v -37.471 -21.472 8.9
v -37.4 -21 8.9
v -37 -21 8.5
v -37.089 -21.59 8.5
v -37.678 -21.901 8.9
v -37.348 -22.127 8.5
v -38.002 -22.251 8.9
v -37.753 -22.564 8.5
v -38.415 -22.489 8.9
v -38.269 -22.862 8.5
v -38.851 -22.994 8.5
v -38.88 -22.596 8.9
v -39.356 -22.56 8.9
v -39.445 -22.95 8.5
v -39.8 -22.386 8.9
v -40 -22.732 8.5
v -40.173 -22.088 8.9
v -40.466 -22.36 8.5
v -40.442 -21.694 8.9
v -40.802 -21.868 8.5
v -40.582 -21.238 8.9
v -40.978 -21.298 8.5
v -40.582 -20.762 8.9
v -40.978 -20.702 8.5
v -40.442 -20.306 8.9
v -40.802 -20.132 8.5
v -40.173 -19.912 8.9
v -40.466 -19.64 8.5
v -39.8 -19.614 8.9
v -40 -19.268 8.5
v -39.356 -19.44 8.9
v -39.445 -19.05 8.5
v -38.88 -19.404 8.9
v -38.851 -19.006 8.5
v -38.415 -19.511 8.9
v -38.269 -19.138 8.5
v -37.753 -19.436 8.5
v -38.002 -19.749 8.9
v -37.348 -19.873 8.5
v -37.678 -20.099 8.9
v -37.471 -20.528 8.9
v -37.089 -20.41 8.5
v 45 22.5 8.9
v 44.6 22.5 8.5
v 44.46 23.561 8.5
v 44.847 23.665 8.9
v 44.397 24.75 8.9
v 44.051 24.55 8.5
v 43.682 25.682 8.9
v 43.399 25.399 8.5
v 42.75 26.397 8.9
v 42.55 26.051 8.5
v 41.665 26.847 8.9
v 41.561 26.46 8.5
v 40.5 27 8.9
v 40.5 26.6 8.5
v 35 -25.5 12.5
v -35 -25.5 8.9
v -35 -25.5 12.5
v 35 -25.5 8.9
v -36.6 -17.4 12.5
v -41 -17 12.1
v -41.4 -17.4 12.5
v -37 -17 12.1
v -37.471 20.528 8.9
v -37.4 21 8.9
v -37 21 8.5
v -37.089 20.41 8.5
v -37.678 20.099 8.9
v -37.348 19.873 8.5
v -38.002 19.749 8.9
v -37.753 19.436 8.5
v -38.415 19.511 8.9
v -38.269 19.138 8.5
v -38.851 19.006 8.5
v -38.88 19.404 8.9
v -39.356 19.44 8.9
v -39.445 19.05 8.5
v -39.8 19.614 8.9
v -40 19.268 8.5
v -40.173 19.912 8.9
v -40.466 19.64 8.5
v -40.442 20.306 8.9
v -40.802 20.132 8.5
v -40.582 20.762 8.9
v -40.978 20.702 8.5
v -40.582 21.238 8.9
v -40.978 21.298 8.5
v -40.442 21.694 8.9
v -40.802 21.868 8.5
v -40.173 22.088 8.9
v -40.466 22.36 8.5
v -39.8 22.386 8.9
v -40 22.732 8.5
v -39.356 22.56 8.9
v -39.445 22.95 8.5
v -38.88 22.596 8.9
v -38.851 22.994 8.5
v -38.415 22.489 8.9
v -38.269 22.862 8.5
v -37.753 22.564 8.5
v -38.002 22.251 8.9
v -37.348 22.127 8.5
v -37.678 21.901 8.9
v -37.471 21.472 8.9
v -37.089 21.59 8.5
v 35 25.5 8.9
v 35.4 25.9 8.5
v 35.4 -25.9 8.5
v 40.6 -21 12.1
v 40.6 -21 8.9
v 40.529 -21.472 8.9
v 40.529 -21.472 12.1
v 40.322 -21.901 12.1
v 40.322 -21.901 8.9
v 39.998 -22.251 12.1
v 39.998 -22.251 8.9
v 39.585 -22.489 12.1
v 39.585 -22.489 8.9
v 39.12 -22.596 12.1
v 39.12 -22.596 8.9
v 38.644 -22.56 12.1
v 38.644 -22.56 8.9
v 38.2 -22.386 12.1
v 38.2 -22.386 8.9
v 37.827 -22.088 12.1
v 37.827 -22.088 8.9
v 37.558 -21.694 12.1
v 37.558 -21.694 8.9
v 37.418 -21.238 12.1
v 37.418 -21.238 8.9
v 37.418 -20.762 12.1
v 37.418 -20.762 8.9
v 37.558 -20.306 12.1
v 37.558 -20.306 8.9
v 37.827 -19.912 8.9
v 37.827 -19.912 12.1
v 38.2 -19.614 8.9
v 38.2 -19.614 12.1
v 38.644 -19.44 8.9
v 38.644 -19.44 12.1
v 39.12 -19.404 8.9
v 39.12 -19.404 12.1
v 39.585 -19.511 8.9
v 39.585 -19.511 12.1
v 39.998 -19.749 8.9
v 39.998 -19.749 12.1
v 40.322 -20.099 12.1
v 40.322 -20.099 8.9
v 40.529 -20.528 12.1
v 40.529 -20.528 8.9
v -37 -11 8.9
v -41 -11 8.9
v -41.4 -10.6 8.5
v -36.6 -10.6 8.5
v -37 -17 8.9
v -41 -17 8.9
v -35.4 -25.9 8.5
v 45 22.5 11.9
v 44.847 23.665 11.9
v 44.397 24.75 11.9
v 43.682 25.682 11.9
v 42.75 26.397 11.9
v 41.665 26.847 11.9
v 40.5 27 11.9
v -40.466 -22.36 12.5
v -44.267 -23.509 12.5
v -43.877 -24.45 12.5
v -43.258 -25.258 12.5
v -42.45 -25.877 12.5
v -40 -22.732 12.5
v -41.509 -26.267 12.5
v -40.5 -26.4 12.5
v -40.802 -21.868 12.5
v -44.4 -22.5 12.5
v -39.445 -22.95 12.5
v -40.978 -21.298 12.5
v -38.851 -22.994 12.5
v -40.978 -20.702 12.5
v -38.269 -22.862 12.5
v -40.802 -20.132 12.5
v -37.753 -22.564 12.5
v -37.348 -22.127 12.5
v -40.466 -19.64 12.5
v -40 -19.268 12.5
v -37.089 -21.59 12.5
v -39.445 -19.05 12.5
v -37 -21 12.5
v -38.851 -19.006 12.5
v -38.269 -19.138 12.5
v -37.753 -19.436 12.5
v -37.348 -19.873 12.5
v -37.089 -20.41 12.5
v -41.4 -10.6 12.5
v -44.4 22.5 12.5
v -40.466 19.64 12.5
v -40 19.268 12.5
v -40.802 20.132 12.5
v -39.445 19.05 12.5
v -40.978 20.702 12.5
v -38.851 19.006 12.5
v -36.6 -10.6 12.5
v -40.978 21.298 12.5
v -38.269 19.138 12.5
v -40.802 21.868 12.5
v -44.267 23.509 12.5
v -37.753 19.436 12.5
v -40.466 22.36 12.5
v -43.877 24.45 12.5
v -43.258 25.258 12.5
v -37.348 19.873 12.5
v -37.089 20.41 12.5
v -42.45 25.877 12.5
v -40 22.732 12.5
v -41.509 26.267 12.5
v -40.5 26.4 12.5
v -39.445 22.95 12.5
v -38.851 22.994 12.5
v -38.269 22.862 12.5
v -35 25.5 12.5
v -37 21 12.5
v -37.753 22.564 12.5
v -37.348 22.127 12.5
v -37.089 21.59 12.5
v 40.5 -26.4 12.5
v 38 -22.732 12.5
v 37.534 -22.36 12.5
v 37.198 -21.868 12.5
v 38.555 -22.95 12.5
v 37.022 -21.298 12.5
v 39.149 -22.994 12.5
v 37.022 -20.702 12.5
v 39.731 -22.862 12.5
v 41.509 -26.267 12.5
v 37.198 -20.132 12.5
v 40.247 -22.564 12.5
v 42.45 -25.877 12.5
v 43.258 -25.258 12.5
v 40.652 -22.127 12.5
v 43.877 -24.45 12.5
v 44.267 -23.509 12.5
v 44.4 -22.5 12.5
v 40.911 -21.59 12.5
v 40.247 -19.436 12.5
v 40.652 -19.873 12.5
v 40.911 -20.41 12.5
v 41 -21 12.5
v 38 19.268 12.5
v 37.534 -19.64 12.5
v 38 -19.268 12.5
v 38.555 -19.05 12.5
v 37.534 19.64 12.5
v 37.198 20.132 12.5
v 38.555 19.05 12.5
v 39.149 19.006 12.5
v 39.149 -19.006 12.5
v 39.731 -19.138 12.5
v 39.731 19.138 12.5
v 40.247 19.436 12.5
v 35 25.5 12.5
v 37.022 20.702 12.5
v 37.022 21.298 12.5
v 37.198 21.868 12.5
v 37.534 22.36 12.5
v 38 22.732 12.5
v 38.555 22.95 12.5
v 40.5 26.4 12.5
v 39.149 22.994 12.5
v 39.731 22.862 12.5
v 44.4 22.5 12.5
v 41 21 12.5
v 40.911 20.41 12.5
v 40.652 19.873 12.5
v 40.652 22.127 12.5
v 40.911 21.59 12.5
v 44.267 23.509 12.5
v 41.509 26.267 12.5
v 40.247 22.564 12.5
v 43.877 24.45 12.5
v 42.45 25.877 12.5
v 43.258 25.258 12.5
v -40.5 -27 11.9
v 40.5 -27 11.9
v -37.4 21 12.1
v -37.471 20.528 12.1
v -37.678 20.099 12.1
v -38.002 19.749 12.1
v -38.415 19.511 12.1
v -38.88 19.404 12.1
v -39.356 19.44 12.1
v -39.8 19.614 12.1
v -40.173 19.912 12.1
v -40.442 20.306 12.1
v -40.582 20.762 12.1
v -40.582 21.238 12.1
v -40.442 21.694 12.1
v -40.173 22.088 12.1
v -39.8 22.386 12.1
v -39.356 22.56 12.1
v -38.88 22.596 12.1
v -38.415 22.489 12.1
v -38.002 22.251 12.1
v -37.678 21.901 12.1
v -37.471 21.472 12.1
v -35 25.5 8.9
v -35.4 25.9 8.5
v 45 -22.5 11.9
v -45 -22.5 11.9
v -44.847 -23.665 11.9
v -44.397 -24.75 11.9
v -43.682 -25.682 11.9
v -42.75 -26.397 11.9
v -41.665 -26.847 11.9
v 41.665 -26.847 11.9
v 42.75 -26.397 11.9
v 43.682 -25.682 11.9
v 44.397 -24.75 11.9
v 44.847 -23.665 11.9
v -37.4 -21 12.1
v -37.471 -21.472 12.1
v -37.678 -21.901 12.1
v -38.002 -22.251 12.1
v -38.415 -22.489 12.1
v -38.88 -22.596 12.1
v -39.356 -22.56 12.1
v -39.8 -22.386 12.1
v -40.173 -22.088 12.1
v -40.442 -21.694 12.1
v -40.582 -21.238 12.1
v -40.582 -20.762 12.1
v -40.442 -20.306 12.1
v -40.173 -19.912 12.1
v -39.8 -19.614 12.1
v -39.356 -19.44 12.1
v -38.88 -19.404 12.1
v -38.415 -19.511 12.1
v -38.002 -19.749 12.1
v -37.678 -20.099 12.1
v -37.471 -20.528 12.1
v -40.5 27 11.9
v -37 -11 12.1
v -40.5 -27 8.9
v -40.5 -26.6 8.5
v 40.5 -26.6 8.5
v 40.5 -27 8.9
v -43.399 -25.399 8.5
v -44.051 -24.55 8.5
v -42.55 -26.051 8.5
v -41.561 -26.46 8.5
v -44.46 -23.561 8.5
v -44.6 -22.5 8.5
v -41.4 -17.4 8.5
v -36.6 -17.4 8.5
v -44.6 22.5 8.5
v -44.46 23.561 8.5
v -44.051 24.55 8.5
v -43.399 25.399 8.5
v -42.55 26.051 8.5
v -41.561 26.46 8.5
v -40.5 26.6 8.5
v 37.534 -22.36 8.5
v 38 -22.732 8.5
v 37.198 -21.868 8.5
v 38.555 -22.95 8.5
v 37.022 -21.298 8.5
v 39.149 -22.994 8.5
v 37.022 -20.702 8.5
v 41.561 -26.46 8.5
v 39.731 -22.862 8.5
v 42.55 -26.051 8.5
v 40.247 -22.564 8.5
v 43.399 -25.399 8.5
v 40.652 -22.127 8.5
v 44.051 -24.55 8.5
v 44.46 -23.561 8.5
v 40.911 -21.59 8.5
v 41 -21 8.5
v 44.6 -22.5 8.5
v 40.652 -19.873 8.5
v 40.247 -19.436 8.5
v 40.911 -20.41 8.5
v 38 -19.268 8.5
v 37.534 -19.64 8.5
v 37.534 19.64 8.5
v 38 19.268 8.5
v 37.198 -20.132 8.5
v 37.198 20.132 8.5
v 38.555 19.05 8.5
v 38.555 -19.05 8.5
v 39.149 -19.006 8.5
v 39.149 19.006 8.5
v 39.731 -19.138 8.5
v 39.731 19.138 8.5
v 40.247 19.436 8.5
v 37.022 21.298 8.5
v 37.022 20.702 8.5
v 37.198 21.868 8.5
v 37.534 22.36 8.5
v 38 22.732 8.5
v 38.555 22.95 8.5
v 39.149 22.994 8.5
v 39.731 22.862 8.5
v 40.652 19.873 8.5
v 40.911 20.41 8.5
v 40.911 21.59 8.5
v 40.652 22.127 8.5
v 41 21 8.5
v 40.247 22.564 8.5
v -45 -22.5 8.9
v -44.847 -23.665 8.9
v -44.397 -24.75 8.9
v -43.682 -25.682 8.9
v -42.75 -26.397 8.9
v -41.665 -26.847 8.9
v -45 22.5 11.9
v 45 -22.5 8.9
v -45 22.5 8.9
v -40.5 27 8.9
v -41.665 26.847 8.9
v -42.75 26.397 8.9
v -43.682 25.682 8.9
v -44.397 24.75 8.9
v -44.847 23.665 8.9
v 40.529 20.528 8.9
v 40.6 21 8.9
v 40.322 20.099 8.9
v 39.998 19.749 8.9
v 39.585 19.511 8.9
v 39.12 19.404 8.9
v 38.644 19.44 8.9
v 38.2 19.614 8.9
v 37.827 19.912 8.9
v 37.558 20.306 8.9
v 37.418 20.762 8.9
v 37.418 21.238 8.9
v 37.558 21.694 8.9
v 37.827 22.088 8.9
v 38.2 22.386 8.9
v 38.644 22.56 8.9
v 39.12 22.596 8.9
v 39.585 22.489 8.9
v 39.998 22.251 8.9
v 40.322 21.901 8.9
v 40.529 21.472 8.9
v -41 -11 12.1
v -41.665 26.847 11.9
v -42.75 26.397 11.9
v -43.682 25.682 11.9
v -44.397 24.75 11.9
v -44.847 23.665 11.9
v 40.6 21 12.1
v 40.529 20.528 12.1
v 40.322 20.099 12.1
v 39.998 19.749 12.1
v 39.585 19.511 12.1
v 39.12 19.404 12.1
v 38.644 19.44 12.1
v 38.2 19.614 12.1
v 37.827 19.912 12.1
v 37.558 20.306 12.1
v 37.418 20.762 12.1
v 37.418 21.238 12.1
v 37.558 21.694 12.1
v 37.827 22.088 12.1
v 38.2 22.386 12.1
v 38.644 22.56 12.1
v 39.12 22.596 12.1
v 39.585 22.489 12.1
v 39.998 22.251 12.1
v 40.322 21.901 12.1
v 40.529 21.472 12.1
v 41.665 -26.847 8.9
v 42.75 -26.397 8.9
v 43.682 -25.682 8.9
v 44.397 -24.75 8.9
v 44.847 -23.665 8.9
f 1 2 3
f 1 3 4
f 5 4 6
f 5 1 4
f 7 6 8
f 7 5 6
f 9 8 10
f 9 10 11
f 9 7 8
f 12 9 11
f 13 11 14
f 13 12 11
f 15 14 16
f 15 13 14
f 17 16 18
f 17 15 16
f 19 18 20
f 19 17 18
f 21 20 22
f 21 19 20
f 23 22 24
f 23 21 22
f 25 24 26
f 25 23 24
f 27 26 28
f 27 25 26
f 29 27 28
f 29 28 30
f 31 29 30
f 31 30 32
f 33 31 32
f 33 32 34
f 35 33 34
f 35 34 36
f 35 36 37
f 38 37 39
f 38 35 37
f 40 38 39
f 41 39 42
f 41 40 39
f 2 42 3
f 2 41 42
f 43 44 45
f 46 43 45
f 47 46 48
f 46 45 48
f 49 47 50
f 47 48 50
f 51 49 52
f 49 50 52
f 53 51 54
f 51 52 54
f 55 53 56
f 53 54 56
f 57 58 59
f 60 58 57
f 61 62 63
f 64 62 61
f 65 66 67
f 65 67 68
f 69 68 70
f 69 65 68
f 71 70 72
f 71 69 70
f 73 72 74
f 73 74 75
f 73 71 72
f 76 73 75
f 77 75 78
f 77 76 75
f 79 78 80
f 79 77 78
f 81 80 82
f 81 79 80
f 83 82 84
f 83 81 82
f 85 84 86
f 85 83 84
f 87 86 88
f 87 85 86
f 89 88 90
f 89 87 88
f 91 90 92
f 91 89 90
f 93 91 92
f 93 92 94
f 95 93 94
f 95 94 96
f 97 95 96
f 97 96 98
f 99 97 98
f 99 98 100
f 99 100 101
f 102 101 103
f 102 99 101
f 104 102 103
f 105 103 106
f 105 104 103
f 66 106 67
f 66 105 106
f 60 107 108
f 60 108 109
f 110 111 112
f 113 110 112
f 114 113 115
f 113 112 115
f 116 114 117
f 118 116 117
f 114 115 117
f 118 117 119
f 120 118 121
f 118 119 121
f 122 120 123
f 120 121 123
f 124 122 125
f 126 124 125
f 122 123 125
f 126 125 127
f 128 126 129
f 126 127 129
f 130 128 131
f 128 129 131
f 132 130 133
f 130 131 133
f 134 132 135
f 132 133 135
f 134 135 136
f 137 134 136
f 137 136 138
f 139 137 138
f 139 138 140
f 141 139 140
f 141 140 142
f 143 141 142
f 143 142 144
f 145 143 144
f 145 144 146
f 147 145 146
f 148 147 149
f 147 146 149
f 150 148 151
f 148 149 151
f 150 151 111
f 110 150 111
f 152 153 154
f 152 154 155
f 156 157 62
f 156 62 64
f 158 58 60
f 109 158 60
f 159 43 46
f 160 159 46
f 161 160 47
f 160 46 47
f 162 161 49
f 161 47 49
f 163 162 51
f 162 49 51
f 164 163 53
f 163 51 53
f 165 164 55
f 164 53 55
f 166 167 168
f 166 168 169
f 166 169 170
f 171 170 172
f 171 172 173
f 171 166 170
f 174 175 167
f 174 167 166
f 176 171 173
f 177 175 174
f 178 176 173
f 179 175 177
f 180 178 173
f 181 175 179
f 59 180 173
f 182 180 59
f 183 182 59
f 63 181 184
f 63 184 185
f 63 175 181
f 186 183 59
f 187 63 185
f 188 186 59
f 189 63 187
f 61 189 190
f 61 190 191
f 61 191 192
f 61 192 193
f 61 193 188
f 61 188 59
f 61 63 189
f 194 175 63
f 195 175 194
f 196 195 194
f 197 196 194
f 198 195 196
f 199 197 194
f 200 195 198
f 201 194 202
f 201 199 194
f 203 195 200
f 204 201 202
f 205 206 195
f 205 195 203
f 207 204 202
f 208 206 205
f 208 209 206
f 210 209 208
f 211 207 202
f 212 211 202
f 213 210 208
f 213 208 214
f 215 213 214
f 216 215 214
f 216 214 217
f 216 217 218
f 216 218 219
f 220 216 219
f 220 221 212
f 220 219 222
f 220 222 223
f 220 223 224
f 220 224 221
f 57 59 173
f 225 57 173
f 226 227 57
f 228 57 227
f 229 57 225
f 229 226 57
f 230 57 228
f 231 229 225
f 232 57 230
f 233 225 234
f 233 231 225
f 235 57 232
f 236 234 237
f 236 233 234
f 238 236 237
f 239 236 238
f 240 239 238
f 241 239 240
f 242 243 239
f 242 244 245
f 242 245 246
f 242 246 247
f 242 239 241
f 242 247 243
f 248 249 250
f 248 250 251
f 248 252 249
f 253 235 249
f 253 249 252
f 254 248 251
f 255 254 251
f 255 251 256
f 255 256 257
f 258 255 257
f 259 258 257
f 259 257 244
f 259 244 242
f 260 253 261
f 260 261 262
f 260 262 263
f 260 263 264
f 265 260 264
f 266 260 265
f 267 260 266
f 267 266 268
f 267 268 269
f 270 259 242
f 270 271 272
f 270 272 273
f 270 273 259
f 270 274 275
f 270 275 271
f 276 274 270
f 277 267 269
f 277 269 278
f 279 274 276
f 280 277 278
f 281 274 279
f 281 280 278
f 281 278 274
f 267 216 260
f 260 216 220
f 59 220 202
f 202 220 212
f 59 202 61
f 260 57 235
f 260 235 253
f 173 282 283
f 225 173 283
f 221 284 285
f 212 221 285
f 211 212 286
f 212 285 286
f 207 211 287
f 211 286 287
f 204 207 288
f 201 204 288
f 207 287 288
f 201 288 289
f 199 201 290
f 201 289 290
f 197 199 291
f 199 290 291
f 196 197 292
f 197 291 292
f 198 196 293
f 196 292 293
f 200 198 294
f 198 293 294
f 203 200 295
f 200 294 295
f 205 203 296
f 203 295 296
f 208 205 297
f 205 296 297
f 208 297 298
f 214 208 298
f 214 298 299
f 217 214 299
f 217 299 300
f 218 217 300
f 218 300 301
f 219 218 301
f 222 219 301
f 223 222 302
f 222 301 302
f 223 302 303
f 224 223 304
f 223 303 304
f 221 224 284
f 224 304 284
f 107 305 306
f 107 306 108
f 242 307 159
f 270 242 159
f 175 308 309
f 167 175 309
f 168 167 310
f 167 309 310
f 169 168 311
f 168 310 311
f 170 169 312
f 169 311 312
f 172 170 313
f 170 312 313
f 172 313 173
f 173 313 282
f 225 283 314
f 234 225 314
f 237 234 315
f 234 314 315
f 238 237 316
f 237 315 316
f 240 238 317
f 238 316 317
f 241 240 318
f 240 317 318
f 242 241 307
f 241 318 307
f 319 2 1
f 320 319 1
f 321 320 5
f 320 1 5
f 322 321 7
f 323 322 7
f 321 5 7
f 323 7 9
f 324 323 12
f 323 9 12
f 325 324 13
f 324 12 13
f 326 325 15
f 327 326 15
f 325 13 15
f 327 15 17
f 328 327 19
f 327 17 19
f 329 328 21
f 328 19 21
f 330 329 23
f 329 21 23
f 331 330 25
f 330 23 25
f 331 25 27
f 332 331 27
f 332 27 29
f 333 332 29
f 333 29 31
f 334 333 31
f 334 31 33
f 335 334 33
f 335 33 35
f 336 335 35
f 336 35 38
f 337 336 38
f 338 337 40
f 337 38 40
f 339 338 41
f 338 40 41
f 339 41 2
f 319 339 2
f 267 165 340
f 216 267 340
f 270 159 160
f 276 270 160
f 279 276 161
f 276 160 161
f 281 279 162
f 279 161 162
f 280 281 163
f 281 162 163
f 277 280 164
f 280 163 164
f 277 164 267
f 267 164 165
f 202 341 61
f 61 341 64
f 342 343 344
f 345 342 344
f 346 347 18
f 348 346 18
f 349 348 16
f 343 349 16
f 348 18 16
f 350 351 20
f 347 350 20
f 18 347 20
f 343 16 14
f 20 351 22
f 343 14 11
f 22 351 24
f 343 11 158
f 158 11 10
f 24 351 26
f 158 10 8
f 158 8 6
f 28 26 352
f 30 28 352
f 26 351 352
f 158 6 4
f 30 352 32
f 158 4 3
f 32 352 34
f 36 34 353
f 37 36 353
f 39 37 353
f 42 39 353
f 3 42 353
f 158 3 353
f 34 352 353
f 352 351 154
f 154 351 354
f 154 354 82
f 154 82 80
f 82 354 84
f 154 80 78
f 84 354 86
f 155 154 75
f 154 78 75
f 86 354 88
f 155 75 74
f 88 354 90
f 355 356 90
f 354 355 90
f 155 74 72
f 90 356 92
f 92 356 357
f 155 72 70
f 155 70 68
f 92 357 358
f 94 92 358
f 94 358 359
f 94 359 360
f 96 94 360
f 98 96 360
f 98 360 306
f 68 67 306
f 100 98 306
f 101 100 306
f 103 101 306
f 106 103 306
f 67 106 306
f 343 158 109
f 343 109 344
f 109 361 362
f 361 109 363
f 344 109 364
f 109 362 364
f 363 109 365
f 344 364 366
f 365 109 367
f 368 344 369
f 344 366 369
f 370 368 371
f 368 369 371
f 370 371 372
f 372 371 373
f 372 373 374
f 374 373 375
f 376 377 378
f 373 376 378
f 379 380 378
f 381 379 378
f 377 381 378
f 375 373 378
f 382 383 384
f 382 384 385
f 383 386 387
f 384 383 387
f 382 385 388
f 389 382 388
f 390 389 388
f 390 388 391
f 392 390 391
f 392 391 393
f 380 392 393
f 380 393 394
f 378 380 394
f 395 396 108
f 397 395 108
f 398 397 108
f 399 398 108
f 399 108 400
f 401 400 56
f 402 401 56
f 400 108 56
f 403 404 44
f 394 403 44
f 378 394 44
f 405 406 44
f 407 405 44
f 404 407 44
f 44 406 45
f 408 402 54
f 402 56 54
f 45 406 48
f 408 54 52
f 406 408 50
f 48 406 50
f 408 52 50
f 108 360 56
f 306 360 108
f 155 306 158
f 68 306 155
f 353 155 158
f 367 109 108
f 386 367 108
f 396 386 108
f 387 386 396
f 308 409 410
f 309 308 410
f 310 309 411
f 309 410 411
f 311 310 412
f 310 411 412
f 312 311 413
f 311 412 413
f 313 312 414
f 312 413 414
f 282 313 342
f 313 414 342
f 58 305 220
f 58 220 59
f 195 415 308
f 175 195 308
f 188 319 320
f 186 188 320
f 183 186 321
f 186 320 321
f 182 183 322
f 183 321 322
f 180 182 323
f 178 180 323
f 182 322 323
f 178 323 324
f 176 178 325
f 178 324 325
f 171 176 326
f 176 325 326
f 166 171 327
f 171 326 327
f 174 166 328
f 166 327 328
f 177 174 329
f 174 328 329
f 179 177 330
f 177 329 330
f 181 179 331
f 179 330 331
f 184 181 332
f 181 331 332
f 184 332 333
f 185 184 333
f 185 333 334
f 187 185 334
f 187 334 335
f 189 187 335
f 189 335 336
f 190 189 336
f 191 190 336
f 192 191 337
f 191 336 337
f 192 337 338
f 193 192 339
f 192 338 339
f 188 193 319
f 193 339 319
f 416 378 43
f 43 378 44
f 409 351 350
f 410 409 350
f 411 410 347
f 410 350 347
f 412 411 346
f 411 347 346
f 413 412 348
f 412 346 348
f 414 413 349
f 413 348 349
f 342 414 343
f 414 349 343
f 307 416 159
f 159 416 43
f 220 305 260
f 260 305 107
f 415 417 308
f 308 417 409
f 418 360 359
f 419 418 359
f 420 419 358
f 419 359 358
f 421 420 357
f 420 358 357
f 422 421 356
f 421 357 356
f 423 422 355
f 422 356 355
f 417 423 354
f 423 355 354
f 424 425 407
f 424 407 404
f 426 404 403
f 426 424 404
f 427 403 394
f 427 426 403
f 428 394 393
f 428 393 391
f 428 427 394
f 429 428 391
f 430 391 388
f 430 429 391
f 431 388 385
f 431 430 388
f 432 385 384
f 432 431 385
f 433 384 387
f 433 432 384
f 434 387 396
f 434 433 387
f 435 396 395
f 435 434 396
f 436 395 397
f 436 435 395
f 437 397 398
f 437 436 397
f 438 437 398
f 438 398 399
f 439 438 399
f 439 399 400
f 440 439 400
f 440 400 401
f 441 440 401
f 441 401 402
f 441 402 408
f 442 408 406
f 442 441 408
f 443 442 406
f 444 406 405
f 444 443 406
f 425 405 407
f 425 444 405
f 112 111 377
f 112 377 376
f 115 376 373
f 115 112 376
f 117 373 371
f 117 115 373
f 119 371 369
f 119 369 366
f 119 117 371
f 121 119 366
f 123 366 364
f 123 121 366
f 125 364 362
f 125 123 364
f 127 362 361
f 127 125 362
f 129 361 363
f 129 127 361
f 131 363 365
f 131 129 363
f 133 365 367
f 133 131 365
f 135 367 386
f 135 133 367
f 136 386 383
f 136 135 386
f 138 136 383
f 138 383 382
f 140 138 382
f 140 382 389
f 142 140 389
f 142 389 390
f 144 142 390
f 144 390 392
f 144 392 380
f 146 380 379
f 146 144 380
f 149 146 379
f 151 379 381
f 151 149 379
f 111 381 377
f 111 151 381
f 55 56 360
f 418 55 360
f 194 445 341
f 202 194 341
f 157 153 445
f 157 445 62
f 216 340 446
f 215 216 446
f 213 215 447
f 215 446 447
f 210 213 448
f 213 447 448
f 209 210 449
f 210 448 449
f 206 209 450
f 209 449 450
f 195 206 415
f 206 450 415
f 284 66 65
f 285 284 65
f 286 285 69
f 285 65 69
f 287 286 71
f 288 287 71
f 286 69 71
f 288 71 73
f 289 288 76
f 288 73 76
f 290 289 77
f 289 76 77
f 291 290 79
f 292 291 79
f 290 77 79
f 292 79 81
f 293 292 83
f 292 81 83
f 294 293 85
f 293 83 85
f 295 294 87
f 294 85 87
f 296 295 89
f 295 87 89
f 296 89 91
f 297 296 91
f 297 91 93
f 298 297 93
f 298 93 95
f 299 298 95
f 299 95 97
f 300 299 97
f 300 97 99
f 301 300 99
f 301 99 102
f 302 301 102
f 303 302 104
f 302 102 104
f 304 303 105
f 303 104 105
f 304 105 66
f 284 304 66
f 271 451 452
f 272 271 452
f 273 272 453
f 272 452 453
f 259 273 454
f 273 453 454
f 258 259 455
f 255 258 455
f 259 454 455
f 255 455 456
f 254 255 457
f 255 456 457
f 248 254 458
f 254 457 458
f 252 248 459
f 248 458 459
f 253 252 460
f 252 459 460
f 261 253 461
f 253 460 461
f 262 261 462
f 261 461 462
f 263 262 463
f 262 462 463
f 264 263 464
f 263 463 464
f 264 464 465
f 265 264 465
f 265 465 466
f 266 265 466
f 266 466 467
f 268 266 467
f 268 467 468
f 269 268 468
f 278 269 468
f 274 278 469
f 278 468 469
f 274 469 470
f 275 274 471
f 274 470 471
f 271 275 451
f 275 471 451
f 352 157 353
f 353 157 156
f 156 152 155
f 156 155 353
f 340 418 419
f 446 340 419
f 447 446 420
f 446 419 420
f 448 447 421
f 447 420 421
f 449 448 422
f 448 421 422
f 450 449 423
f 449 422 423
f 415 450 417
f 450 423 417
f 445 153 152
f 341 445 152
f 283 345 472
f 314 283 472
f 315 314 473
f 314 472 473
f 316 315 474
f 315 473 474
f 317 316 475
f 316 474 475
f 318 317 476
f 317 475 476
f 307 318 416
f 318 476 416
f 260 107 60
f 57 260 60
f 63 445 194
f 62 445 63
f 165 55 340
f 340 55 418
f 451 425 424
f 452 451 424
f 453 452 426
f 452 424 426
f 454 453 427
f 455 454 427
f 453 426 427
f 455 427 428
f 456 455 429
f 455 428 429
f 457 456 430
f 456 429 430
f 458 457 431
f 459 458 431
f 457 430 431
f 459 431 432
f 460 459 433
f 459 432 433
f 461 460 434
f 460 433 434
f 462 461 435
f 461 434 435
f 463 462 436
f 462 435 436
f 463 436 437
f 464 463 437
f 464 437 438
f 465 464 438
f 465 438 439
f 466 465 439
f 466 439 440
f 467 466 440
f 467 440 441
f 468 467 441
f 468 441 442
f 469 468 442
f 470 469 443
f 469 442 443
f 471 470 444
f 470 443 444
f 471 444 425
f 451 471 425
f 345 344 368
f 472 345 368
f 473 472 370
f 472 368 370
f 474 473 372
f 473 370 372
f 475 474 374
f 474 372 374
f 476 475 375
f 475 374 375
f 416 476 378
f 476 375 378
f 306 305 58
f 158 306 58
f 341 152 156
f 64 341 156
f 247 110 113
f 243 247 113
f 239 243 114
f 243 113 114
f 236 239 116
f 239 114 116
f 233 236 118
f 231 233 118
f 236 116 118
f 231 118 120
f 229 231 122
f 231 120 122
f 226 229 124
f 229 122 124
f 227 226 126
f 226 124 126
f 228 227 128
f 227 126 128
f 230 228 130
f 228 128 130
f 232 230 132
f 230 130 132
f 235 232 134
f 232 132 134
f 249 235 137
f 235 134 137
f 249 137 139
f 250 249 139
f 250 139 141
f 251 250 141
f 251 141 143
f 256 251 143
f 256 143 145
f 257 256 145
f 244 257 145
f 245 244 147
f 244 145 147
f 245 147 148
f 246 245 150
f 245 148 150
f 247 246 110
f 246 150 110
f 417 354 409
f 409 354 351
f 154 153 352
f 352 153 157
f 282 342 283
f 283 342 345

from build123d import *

# Parameters (mm, degrees)
PAD007_DEPTH    = 4
SKETCH018_R     = 1.6
SKETCH018_W     = 70
SKETCH018_H     = 51
SKETCH018_W_2   = 4
SKETCH018_H_2   = 6
POCKET005_DEPTH = 4
CHAMFER006_SIZE = 0.4
CHAMFER009_SIZE = 0.6


with BuildPart() as part:
    # Sketch017 → Pad007 (new body)
    with BuildSketch(Plane.XY):
        with BuildLine():
            Line((-40.5, -27), (40.5, -27))
            ThreePointArc((40.5, -27), (43.681981, -25.681981), (45, -22.5))
            Line((45, -22.5), (45, 22.5))
            ThreePointArc((45, 22.5), (43.681981, 25.681981), (40.5, 27))
            Line((40.5, 27), (-40.5, 27))
            ThreePointArc((-40.5, 27), (-43.681981, 25.681981), (-45, 22.5))
            Line((-45, 22.5), (-45, -22.5))
            ThreePointArc((-45, -22.5), (-43.681981, -25.681981), (-40.5, -27))
        make_face()
    extrude(amount=PAD007_DEPTH)

    # Sketch018 (on Face9 of Pad007) → Pocket005 (cut)
    with BuildSketch(Plane(origin=(0, 0, 0), x_dir=(1, 0, 0), z_dir=(0, 0, -1))):
        with Locations((-39, 21)):
            Circle(SKETCH018_R)
        with Locations((39, 21)):
            Circle(SKETCH018_R)
        with Locations((39, -21)):
            Circle(SKETCH018_R)
        with Locations((-39, -21)):
            Circle(SKETCH018_R)
        Rectangle(SKETCH018_W, SKETCH018_H)
        with Locations((-39, 14)):
            Rectangle(SKETCH018_W_2, SKETCH018_H_2)
    extrude(amount=-POCKET005_DEPTH, mode=Mode.SUBTRACT)

    # Chamfer006
    chamfer006_edges = [part.edges().sort_by_distance(p)[0] for p in [
        (0, -27, 0),
        (-43.681981, -25.681981, 0),
        (43.681981, -25.681981, 0),
        (-45, 0, 0),
        (45, 0, 0),
        (-43.681981, 25.681981, 0),
        (43.681981, 25.681981, 0),
        (0, 27, 0),
        (-40.6, -21, 0),
        (-41, -14, 0),
        (-39, -17, 0),
        (-37, -14, 0),
        (-39, -11, 0),
        (37.4, -21, 0),
        (-40.6, 21, 0),
        (-35, 0, 0),
        (0, -25.5, 0),
        (35, 0, 0),
        (0, 25.5, 0),
        (37.4, 21, 0),
        (-40.6, -21, 4),
        (-39, -17, 4),
        (-41, -14, 4),
        (-39, -11, 4),
        (-37, -14, 4),
        (-40.6, 21, 4),
        (37.4, 21, 4),
        (37.4, -21, 4),
    ]]
    chamfer(chamfer006_edges, length=CHAMFER006_SIZE)

    # Chamfer009
    chamfer009_edges = [part.edges().sort_by_distance(p)[0] for p in [
        (-45, 0, 4),
    ]]
    chamfer(chamfer009_edges, length=CHAMFER009_SIZE)


with BuildPart() as part_1:
    # Body001 placement: moved
    add(part.part.moved(Location((0, 0, 8.5))))


solid = part_1.part
